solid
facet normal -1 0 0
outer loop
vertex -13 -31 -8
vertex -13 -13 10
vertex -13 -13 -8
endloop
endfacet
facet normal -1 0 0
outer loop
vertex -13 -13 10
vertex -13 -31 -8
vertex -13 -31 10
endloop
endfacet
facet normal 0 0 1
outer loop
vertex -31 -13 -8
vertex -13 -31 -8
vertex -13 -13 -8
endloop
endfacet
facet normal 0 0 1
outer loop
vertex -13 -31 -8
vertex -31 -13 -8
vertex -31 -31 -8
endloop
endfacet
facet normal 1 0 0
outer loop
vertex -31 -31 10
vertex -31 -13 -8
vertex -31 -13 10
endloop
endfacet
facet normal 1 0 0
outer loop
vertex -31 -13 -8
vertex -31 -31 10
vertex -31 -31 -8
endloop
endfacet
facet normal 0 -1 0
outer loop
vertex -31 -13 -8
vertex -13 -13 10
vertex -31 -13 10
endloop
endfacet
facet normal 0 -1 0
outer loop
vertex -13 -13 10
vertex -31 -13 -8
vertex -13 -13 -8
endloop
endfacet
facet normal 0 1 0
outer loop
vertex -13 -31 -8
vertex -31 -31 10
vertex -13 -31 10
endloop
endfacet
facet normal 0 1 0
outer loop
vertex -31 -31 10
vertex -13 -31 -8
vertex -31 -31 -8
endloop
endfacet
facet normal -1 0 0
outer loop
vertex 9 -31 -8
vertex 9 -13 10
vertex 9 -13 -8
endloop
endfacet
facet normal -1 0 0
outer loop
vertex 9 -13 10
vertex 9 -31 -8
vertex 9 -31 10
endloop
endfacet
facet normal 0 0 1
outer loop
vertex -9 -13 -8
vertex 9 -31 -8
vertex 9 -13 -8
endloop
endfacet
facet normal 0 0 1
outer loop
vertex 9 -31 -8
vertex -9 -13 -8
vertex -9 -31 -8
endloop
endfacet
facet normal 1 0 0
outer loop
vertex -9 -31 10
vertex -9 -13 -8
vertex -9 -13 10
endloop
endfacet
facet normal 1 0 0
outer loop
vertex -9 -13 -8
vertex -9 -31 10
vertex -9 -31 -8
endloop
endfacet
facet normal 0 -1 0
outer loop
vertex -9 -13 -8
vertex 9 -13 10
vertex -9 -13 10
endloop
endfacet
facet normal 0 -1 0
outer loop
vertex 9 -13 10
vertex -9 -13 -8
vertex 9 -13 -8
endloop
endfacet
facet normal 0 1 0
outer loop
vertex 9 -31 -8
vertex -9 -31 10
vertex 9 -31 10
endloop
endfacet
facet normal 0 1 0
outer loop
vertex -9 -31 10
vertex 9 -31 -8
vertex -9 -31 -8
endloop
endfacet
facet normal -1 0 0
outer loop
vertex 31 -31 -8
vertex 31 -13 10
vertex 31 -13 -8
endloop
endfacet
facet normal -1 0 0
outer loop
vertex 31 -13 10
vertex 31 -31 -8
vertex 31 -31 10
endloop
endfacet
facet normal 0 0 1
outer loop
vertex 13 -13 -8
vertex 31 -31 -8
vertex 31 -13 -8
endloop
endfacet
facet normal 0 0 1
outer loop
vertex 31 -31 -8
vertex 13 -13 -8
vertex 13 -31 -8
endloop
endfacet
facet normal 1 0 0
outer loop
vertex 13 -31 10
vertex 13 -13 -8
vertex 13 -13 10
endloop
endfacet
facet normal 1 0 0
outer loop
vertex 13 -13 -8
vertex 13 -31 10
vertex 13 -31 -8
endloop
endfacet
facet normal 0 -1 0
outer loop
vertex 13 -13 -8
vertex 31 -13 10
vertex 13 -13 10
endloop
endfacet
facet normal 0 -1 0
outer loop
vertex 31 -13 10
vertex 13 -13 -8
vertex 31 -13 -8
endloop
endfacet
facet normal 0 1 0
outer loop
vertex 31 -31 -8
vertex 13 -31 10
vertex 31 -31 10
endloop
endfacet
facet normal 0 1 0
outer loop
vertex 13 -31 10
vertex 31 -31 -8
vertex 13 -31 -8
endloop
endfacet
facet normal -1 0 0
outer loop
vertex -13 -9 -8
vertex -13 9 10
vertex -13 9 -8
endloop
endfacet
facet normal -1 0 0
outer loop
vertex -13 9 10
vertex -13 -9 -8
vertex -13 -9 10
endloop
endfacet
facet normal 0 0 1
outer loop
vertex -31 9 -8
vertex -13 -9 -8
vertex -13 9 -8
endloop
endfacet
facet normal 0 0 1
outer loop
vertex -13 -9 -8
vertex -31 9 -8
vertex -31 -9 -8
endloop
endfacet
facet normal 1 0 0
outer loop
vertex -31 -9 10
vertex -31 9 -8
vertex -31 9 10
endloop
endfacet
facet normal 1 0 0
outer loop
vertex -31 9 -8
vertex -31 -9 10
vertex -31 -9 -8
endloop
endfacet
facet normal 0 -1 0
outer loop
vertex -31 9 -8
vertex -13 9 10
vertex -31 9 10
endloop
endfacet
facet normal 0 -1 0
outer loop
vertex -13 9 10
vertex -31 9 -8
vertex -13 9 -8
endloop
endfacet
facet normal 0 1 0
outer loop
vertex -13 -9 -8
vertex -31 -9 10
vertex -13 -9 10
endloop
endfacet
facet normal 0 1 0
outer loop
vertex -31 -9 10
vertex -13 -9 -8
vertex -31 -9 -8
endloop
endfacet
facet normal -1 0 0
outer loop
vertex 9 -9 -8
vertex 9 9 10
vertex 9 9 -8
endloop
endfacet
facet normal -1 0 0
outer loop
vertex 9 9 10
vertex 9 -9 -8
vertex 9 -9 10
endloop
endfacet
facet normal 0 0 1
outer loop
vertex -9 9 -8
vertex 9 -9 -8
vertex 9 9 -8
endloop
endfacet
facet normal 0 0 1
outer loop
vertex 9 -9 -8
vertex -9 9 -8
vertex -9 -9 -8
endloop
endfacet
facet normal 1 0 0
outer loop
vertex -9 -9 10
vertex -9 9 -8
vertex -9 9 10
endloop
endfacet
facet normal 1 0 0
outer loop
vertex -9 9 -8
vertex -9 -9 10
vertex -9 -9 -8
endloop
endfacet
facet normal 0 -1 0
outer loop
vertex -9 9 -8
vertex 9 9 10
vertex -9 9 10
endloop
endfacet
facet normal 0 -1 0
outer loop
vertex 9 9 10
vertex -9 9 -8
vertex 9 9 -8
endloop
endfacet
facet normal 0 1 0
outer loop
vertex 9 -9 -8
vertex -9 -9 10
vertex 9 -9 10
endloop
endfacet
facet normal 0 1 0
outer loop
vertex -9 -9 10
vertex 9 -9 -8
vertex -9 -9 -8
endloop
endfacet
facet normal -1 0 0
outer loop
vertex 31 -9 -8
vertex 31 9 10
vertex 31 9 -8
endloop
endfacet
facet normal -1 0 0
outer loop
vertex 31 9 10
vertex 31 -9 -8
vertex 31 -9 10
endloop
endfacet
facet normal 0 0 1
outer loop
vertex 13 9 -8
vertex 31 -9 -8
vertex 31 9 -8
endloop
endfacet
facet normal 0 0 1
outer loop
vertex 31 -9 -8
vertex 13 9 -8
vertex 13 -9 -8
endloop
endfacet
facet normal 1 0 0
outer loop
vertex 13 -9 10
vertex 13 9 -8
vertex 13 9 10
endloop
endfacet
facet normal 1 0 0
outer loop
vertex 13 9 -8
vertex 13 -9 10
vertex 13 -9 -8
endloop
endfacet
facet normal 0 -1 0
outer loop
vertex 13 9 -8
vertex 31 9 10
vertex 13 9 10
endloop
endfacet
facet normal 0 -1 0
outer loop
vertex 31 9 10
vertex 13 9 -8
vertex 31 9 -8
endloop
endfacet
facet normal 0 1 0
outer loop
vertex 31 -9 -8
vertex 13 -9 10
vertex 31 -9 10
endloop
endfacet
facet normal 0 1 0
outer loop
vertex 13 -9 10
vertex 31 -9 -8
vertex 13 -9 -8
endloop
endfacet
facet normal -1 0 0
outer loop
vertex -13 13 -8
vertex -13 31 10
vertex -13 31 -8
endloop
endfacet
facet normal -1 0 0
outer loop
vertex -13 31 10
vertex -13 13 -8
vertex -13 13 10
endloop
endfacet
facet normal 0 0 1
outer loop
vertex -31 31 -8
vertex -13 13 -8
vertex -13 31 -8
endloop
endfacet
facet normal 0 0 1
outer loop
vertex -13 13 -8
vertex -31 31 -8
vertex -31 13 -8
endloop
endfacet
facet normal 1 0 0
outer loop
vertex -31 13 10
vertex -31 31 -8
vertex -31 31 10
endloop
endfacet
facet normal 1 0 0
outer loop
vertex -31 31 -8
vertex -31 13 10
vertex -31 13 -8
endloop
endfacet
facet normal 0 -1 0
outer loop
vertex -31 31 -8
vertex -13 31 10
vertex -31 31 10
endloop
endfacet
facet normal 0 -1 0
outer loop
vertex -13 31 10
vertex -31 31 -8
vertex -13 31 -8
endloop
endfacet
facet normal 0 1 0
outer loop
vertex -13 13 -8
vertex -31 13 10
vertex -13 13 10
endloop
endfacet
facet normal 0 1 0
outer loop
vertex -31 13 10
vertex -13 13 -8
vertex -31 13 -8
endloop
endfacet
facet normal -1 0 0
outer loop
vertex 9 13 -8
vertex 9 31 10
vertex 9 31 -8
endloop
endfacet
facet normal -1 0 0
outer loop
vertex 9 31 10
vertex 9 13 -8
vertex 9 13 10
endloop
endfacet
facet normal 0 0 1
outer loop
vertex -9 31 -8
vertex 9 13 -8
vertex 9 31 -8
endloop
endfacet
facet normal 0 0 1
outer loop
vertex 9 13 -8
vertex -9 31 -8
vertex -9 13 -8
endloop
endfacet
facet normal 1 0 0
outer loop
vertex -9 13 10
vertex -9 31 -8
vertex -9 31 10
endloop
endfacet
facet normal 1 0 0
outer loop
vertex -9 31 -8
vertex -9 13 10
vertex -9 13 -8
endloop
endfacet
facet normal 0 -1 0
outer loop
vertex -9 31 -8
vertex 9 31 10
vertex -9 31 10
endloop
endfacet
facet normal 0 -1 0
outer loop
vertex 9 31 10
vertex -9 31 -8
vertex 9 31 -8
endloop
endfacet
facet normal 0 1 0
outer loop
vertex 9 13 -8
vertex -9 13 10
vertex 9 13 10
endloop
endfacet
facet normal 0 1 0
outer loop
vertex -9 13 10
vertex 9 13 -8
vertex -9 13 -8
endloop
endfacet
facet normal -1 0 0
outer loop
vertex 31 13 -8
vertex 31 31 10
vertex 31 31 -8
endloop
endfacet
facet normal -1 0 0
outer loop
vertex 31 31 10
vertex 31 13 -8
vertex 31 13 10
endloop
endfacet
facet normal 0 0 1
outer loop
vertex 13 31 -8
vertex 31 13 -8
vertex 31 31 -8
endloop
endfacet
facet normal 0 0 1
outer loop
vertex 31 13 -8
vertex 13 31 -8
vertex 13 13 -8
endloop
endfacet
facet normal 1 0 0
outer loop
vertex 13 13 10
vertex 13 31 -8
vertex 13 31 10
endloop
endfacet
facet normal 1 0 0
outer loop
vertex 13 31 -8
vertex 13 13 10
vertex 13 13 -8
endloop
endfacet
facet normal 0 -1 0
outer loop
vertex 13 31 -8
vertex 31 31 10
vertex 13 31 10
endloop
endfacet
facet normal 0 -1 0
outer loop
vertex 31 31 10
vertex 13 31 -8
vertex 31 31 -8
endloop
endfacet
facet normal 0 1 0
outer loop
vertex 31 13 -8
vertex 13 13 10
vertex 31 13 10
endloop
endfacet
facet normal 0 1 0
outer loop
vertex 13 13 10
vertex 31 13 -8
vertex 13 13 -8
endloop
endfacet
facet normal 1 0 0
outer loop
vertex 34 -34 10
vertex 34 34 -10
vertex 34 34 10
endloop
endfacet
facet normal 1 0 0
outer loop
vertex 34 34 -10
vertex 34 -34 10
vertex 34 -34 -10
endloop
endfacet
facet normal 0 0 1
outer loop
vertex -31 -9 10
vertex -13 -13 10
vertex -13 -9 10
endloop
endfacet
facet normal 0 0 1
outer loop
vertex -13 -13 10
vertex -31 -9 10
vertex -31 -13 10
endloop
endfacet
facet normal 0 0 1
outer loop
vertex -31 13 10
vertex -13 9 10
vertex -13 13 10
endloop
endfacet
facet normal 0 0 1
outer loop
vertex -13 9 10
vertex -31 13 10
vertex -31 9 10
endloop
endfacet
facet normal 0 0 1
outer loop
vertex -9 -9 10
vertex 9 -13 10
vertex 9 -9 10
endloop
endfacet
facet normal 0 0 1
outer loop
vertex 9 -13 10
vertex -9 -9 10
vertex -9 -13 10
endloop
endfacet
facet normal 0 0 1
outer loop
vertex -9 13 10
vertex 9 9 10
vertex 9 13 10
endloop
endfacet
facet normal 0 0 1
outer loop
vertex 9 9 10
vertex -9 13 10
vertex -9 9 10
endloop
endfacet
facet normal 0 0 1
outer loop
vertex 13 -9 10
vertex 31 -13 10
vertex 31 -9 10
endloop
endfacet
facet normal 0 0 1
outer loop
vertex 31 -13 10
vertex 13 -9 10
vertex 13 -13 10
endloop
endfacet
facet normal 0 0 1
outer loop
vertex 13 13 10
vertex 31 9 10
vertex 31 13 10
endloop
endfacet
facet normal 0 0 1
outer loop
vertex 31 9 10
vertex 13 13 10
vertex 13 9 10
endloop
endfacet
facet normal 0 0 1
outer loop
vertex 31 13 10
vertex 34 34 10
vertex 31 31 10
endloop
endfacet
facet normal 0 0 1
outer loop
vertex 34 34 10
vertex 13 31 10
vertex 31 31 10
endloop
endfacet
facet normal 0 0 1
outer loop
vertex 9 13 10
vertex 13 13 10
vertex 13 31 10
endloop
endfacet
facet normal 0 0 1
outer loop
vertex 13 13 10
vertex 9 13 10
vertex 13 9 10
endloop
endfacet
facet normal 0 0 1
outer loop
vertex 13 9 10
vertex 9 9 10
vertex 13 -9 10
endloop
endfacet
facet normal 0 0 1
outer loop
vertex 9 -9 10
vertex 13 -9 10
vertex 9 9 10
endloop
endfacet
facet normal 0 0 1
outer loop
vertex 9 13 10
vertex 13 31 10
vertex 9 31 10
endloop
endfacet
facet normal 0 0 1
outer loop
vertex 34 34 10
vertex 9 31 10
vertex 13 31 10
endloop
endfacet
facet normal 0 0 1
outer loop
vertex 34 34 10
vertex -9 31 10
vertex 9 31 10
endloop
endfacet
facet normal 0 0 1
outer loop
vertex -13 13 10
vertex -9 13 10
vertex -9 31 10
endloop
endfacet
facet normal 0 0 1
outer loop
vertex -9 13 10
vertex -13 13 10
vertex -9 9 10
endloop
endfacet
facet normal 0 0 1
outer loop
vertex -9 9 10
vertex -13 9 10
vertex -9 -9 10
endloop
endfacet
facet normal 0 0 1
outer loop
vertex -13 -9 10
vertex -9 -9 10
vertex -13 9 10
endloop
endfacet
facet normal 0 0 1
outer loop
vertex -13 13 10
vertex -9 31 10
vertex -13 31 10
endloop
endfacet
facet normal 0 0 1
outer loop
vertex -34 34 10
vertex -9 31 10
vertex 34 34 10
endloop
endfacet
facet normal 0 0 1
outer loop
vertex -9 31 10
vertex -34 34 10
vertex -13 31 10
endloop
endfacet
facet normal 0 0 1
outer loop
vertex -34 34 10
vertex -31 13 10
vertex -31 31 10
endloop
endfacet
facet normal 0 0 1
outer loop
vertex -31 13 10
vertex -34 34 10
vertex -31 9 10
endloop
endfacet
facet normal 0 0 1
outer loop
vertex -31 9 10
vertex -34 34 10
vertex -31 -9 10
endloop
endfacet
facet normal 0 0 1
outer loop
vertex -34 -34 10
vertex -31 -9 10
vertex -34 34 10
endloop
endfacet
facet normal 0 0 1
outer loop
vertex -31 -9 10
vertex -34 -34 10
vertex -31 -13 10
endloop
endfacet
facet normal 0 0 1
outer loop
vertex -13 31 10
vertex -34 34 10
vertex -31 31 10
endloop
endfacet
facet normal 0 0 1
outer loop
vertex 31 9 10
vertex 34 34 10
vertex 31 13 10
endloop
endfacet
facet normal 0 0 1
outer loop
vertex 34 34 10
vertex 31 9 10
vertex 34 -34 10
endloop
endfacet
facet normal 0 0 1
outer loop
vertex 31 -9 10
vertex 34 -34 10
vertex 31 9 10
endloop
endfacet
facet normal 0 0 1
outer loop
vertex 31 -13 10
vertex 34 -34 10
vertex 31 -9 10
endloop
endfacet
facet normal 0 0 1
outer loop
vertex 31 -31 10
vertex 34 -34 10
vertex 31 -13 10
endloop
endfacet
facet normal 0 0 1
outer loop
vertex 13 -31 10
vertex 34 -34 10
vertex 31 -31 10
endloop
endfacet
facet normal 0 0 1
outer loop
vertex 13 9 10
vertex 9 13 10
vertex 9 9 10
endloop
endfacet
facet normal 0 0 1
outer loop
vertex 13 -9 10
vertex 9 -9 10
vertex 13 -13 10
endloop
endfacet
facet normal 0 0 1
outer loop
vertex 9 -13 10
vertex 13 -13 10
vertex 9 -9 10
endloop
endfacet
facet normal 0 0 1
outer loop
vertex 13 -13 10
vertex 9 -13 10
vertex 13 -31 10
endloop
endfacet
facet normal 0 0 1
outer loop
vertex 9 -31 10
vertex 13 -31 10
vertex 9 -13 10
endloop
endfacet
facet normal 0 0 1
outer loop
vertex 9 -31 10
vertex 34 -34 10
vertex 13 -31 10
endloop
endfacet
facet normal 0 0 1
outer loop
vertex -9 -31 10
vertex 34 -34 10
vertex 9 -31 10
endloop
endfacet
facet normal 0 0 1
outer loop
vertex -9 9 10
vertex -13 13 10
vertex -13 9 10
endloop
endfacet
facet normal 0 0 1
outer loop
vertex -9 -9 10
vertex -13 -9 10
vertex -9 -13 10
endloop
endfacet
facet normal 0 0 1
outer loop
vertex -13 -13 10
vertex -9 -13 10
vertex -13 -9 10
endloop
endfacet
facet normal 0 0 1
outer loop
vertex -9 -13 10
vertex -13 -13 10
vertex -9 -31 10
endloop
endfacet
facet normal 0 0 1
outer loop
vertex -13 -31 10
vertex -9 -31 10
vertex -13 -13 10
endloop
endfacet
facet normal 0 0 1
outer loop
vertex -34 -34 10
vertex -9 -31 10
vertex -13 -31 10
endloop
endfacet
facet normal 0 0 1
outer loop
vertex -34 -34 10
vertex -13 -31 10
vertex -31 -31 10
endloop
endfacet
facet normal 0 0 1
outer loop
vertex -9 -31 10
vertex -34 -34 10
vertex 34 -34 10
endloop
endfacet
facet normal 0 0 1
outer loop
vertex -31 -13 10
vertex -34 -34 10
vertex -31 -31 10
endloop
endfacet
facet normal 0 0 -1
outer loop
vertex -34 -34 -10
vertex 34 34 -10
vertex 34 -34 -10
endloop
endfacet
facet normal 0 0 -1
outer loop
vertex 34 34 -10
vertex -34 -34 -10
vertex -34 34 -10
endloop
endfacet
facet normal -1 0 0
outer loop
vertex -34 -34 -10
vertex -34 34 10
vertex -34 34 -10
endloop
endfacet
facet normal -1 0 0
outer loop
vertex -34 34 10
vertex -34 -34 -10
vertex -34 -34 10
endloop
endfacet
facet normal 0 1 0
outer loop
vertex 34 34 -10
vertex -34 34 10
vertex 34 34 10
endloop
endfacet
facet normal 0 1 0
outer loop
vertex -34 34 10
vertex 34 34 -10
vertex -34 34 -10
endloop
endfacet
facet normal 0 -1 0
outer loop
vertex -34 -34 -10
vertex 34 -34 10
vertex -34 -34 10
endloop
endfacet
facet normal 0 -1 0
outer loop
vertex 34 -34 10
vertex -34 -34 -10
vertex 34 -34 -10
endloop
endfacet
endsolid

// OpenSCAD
$fn = 32;

// ----------------------------------------------------------------------
// Pocket plate 68 x 68 x 20
// 3 x 3 pockets 18 mm square, 18 mm deep
// ----------------------------------------------------------------------

// --- parameters (mm) ---
thickness = 20;  // plate thickness
floor_t = 2;     // material left under each pocket
pocket = 18;     // pocket side length
pitch_x = 22;    // pocket pitch along X
pitch_y = 22;    // pocket pitch along Y
cols = 3;        // pockets per row
rows = 3;        // rows of pockets

// --- derived feature positions (mm) ---
depth = thickness - floor_t;        // = 18   pocket depth, down to the floor
span_x = (cols - 1) * pitch_x;      // = 44   distance between outer pockets
span_y = (rows - 1) * pitch_y;      // = 44   distance between outer pocket rows
origin_x = -span_x / 2;             // = -22   X of the first pocket
origin_y = -span_y / 2;             // = -22   Y of the first pocket
plate = [span_x + pocket + 6, span_y + pocket + 6, thickness];  // = [68, 68, 20]   overall size: pockets plus 3 mm of wall on each side
feature_centers = [
  [origin_x + 0 * pitch_x, origin_y + 0 * pitch_y],
  [origin_x + 1 * pitch_x, origin_y + 0 * pitch_y],
  [origin_x + 2 * pitch_x, origin_y + 0 * pitch_y],
  [origin_x + 0 * pitch_x, origin_y + 1 * pitch_y],
  [origin_x + 1 * pitch_x, origin_y + 1 * pitch_y],
  [origin_x + 2 * pitch_x, origin_y + 1 * pitch_y],
  [origin_x + 0 * pitch_x, origin_y + 2 * pitch_y],
  [origin_x + 1 * pitch_x, origin_y + 2 * pitch_y],
  [origin_x + 2 * pitch_x, origin_y + 2 * pitch_y]
];   // pocket centres, used verbatim by the cutter loop

// plate outline, then one pocket per centre in feature_centers
difference() {
  cube(plate, center = true);
  for (centre = feature_centers)
    translate([centre[0] - pocket / 2, centre[1] - pocket / 2, plate[2] / 2 - depth])
      cube([pocket, pocket, depth + 1]);  // centred on the declared pocket centre
}
